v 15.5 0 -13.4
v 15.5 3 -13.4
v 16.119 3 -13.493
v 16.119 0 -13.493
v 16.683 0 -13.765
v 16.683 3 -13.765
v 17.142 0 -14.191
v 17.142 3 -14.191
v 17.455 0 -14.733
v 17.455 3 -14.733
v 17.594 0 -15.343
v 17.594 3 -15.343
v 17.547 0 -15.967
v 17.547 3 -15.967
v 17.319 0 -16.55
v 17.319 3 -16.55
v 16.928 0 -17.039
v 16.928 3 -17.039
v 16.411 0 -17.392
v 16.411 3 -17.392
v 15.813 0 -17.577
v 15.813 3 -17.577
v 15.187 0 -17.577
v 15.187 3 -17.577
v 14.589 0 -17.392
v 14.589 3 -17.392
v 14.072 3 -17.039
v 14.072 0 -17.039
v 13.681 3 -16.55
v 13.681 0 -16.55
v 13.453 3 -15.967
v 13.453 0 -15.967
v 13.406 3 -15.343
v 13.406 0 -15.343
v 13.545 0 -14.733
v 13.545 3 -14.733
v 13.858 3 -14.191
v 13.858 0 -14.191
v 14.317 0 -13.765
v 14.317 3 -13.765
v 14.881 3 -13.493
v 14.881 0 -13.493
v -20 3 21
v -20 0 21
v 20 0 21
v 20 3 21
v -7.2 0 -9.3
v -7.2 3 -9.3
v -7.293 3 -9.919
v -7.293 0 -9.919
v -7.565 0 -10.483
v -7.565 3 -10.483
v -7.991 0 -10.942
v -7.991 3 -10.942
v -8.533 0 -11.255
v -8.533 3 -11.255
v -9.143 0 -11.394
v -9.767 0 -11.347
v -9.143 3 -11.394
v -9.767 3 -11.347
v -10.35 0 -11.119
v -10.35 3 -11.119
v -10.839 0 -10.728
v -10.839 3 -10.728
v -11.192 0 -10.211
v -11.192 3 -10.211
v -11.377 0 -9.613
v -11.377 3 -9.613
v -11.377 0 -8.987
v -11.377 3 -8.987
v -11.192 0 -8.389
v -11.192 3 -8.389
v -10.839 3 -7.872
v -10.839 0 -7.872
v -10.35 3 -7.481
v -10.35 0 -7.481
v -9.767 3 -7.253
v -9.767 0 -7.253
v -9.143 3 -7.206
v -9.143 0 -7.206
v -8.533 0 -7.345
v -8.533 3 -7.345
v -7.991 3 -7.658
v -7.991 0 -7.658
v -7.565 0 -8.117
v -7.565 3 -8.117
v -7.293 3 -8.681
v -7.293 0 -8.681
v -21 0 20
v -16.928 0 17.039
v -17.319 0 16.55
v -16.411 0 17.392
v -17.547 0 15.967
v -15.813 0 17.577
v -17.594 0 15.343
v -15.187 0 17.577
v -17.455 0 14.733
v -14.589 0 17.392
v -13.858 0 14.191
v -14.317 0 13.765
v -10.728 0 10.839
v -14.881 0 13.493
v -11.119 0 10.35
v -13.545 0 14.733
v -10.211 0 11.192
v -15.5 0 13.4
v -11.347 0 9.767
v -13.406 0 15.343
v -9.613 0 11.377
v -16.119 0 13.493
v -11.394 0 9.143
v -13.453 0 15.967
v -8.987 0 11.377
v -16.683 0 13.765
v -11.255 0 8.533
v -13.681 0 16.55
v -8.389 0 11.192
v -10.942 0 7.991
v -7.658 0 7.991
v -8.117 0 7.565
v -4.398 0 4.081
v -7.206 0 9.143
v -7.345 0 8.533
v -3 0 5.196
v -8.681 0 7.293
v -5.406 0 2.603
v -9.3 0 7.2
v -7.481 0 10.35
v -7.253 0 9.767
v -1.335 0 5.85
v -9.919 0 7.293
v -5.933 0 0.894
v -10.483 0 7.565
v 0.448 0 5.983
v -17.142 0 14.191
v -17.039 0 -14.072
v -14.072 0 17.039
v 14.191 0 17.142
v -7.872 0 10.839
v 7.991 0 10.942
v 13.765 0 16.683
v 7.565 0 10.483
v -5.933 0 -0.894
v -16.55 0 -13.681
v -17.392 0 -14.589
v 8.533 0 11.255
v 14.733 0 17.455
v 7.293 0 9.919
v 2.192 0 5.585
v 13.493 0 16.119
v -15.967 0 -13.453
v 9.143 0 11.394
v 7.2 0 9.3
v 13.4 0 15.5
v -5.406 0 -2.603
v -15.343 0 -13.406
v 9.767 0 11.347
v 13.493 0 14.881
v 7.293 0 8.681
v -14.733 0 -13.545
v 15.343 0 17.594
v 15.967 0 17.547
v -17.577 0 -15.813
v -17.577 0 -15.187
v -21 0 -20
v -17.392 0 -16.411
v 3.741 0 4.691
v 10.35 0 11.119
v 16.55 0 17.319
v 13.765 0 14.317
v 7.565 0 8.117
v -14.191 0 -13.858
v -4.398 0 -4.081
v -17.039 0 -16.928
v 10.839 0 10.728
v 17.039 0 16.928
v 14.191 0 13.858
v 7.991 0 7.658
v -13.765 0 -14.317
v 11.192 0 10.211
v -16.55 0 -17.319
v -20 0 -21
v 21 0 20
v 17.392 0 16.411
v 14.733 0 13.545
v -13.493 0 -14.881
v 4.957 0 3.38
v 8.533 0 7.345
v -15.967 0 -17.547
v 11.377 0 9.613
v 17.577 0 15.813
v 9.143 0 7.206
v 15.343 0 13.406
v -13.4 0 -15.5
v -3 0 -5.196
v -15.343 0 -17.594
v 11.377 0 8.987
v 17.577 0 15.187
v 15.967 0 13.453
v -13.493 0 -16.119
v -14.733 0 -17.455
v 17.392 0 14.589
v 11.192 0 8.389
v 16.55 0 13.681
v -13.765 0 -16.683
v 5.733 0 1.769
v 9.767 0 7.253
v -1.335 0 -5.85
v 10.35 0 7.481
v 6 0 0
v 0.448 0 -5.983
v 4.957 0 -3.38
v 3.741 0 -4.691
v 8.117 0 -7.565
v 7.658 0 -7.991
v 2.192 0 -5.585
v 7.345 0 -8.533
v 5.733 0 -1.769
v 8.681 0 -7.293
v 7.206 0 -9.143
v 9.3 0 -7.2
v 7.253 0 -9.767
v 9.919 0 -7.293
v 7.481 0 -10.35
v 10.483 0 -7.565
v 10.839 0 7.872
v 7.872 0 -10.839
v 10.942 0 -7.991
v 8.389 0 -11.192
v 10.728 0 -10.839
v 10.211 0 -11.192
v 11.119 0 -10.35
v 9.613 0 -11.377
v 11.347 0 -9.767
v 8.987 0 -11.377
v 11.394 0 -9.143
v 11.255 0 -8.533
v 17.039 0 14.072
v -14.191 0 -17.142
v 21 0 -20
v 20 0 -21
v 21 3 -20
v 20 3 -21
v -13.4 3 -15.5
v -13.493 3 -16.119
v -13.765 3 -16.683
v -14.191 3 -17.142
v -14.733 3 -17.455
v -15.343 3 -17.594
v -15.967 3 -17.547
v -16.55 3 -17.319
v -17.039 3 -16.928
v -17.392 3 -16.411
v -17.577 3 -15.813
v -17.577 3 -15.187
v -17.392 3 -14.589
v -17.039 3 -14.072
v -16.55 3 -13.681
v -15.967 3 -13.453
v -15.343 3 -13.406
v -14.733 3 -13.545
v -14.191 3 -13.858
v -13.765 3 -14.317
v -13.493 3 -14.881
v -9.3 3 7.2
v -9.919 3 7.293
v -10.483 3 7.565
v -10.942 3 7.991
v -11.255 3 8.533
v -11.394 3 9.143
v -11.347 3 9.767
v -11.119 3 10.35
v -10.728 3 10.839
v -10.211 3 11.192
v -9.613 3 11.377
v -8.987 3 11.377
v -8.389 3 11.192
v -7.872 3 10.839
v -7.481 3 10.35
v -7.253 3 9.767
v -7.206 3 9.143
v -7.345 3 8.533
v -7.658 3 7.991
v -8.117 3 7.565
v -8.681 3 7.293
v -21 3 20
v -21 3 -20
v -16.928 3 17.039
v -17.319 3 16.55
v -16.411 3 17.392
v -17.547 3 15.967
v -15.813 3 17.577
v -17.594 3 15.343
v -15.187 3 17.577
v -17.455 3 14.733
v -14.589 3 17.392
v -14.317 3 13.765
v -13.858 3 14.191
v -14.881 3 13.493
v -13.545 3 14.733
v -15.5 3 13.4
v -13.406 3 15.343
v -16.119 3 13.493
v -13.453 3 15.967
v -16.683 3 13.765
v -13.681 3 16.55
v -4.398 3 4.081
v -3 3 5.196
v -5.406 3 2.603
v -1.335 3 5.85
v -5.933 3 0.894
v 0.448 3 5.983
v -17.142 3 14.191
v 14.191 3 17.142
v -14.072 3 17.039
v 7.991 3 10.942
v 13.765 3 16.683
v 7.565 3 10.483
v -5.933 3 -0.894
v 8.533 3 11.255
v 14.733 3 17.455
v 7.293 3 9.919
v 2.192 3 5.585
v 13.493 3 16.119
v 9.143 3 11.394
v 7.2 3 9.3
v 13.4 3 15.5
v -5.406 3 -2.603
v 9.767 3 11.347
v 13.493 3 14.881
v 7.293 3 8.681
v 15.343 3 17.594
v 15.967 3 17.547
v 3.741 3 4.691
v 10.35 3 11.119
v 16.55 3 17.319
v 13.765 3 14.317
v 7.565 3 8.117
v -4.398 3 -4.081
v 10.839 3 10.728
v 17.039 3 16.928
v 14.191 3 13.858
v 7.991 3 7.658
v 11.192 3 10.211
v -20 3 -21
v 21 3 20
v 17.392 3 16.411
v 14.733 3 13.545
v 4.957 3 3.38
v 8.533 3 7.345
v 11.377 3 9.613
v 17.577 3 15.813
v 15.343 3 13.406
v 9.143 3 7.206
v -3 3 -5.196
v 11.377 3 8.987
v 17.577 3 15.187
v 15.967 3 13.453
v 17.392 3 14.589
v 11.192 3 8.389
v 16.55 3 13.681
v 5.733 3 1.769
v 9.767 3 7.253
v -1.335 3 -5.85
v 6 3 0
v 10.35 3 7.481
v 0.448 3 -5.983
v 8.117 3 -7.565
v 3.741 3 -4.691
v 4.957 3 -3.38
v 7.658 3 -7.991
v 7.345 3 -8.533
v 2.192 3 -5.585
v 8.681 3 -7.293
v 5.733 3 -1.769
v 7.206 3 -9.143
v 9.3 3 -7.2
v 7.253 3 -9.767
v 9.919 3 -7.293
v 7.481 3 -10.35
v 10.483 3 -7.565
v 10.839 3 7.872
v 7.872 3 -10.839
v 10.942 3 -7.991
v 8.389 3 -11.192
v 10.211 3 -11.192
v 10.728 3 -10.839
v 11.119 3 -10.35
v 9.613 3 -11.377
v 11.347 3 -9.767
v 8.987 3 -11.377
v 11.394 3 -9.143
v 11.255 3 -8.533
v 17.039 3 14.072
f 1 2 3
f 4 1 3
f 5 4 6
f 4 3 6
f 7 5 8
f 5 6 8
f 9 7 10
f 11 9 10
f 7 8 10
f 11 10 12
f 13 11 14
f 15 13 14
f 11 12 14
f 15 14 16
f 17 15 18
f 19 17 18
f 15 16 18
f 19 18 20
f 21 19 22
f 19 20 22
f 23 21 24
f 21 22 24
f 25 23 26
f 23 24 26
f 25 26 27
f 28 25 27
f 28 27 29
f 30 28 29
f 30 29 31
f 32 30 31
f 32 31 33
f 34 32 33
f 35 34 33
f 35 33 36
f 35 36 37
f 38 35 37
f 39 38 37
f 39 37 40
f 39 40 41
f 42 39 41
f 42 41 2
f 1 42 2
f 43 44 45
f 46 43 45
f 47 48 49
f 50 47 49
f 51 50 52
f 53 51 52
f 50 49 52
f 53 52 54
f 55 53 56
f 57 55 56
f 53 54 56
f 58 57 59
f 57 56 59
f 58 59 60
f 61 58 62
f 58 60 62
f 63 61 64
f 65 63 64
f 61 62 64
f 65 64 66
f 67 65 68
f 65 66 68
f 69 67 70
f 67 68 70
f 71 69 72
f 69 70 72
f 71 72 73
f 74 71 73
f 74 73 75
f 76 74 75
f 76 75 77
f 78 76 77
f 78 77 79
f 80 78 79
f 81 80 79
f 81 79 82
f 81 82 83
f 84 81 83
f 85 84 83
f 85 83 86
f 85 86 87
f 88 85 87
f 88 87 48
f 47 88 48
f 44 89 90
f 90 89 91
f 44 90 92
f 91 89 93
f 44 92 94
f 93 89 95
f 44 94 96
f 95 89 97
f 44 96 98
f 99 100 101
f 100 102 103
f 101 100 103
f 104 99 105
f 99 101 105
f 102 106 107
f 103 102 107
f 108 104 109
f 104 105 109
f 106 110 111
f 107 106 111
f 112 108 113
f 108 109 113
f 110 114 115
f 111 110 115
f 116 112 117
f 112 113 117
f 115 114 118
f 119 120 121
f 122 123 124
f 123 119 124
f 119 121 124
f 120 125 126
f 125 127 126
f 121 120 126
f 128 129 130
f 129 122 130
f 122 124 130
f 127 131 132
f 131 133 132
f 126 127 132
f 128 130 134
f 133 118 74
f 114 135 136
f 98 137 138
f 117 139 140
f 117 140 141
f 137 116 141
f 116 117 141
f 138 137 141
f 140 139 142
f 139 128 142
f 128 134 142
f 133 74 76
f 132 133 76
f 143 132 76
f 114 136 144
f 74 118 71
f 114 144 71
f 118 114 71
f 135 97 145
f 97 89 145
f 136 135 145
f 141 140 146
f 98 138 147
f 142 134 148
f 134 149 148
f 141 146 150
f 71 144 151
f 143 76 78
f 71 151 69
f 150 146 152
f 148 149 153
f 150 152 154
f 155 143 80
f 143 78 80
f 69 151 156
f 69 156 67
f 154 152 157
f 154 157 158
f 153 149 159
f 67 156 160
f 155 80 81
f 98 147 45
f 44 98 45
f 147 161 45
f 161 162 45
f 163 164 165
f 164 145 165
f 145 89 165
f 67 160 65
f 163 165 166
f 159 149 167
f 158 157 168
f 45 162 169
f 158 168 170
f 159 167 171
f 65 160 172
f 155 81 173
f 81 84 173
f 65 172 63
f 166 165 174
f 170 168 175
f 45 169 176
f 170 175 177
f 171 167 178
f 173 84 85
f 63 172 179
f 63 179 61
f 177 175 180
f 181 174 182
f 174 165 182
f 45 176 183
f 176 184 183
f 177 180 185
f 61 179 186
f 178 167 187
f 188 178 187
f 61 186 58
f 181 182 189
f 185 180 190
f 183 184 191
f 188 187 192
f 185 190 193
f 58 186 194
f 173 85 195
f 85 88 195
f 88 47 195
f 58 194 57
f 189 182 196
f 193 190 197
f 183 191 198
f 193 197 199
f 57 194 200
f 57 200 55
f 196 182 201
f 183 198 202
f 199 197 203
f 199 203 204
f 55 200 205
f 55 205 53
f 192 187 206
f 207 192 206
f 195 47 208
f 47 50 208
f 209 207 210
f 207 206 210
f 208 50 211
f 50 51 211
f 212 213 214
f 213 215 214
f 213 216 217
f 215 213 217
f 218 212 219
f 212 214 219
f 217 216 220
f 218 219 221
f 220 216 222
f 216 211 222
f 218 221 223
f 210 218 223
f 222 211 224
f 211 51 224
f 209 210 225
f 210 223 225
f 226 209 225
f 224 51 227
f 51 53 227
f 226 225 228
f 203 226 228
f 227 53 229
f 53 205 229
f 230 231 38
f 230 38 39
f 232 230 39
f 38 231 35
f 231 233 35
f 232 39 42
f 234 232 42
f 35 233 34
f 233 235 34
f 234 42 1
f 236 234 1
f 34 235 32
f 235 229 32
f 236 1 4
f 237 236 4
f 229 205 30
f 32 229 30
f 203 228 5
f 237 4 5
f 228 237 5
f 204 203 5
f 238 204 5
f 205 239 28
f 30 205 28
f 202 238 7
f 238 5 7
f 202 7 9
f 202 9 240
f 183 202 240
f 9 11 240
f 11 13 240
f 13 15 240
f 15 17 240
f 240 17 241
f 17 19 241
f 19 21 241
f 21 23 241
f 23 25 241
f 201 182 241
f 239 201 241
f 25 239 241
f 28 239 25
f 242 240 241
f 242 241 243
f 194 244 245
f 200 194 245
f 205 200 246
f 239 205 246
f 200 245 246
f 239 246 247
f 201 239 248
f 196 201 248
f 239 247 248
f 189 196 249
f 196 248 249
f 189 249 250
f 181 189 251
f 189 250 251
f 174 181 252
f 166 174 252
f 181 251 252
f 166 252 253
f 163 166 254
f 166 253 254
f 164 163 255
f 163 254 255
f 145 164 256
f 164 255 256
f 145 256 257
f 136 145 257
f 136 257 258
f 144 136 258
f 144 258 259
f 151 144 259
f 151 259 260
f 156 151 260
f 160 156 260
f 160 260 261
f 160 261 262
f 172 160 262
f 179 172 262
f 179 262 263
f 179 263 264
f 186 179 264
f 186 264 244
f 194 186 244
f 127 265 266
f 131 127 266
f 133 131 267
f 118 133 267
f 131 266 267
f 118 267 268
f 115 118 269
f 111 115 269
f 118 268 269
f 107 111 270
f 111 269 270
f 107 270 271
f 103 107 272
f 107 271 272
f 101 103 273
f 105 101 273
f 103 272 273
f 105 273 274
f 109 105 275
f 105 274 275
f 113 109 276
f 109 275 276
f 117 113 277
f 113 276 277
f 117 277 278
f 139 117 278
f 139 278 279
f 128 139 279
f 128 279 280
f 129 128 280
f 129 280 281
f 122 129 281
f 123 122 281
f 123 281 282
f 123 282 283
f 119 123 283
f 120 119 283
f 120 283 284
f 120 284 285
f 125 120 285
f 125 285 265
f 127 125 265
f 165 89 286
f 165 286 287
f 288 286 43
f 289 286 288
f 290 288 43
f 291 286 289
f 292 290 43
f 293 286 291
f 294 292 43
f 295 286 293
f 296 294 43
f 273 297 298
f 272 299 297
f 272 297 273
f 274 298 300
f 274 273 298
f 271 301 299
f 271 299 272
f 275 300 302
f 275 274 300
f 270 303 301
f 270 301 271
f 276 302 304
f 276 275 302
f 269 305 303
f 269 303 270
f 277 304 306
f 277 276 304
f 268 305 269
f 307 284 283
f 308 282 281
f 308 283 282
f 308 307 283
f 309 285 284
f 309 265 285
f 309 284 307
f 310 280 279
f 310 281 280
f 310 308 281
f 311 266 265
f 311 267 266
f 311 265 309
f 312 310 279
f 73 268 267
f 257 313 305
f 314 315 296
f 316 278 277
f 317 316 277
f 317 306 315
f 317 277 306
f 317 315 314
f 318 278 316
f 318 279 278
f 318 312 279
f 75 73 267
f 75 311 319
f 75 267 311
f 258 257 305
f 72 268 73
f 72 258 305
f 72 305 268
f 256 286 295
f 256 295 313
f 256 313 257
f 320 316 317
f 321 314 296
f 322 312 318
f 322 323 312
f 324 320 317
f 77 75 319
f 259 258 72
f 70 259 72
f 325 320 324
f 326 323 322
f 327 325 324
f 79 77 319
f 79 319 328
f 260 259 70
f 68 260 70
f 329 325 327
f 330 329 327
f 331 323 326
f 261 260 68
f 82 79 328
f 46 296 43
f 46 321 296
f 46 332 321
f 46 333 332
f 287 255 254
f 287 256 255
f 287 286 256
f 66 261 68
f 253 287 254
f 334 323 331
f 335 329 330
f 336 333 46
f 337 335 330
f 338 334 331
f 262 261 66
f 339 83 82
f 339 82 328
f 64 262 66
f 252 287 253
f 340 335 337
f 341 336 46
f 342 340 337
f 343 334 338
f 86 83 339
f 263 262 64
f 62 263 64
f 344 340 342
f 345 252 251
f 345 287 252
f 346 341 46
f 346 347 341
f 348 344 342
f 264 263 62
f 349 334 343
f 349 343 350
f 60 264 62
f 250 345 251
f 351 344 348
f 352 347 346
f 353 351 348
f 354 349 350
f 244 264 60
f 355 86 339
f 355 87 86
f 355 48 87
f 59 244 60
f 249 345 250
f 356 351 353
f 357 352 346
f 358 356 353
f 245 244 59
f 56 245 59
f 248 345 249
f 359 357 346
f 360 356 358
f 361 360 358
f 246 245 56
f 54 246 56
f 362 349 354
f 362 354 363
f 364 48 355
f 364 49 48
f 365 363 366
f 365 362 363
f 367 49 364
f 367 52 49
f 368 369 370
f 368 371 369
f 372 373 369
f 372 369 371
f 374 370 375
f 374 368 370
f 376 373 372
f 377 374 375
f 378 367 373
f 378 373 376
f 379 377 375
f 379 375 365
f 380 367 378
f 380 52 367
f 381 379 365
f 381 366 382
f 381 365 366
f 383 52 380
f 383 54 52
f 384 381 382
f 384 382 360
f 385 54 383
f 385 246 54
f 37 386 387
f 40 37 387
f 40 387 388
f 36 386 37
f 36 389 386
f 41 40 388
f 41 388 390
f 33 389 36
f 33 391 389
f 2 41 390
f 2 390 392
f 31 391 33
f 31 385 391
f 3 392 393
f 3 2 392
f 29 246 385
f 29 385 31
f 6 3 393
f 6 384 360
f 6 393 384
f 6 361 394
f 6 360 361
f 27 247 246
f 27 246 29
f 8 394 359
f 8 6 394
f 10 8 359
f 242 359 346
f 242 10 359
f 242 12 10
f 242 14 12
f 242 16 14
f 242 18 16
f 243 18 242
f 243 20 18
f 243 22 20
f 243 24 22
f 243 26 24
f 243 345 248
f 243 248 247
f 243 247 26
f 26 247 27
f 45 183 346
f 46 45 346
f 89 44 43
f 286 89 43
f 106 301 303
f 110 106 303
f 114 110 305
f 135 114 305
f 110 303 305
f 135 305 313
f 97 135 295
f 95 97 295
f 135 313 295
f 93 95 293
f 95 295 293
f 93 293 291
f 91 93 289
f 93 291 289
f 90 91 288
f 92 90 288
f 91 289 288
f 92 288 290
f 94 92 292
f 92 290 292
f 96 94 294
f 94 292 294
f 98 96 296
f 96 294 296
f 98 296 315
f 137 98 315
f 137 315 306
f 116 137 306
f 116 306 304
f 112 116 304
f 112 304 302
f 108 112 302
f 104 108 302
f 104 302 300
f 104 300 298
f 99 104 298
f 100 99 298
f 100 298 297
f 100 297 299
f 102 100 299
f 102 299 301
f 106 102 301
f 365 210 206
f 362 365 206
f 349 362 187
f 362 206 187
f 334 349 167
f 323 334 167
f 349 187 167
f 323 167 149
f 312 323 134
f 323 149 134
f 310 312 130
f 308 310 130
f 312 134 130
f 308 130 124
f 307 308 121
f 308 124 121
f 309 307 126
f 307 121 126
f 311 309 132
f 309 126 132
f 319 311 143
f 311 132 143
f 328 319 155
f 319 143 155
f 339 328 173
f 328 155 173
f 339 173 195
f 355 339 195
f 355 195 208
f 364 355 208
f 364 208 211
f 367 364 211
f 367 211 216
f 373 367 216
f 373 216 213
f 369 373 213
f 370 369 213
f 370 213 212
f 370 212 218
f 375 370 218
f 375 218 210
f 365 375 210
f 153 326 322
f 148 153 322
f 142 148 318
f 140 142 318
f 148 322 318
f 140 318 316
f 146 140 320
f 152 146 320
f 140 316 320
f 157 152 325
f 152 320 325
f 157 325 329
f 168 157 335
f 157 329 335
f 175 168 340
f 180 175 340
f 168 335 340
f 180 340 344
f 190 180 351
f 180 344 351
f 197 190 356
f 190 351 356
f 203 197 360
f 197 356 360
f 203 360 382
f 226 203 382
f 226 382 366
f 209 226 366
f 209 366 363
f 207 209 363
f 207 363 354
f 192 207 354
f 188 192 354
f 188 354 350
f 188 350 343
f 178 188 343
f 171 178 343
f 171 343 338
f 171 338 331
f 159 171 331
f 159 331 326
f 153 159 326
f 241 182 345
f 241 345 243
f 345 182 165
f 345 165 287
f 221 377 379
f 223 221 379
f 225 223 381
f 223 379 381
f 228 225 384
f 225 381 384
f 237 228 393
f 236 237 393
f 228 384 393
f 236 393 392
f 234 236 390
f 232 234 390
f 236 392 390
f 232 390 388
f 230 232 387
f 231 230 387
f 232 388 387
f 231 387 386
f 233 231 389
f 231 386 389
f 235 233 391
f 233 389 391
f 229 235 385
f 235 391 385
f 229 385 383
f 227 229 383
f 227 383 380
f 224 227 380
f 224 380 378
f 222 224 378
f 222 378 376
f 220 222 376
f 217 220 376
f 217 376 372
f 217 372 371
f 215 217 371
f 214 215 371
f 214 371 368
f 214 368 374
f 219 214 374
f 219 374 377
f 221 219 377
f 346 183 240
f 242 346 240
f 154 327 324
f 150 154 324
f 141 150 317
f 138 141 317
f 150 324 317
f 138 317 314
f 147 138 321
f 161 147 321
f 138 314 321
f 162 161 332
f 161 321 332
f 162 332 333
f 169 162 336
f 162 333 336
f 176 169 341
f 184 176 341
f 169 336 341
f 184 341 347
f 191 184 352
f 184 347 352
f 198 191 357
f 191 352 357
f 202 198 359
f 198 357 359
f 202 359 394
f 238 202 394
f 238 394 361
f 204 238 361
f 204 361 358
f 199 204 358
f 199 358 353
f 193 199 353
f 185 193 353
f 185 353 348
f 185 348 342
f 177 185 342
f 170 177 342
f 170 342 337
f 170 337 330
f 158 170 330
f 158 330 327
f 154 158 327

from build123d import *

# Parameters (mm, degrees)
SKETCH_1_W               = 42
SKETCH_1_H               = 42
EXTRUDE_1_DEPTH          = 3
SKETCH_2_R               = 6
CUT_EXTRUDE_1_DEPTH      = 4
SKETCH_4_R               = 2.1
CUT_EXTRUDE_2_DEPTH      = 4
SKETCH_5_R               = 2.1
CUT_EXTRUDE_3_DEPTH      = 4
PATTERN_CIRCULAR_1_COUNT = 4
CHAMFER_1_SIZE           = 1


with BuildPart() as part:
    # 草圖1 → 填料-伸長1 (new body)
    with BuildSketch(Plane(origin=(0, 0, 0), x_dir=(1, 0, 0), z_dir=(0, 1, 0))):
        Rectangle(SKETCH_1_W, SKETCH_1_H)
    extrude(amount=EXTRUDE_1_DEPTH)

    # 草圖2 → 除料-伸長1 (cut, through all)
    with BuildSketch(Plane.XZ):
        Circle(SKETCH_2_R)
    extrude(amount=-CUT_EXTRUDE_1_DEPTH, mode=Mode.SUBTRACT)

    # 草圖4 → 除料-伸長2 (cut, through all)
    with BuildSketch(Plane(origin=(0, 3, 0), x_dir=(1, 0, 0), z_dir=(0, 1, 0))):
        with Locations((-9.3, 9.3)):
            Circle(SKETCH_4_R)
    cut_extrude_2 = extrude(amount=-CUT_EXTRUDE_2_DEPTH, mode=Mode.SUBTRACT)

    # 草圖5 → 除料-伸長3 (cut, through all)
    with BuildSketch(Plane(origin=(0, 3, 0), x_dir=(1, 0, 0), z_dir=(0, 1, 0))):
        with Locations((-15.5, 15.5)):
            Circle(SKETCH_5_R)
    cut_extrude_3 = extrude(amount=-CUT_EXTRUDE_3_DEPTH, mode=Mode.SUBTRACT)

    # 環狀複製排列1: 除料-伸長2, 除料-伸長3 ×4 about axis
    pattern_circular_1_axis = Axis((0, 0, 0), (0, 1, 0))
    for i in range(1, PATTERN_CIRCULAR_1_COUNT):
        add(cut_extrude_2.rotate(pattern_circular_1_axis, i * 360 / PATTERN_CIRCULAR_1_COUNT), mode=Mode.SUBTRACT)
        add(cut_extrude_3.rotate(pattern_circular_1_axis, i * 360 / PATTERN_CIRCULAR_1_COUNT), mode=Mode.SUBTRACT)

    # 導角1
    chamfer_1_edges = [part.edges().sort_by_distance(p)[0] for p in [
        (21, 1.5, 21),
        (-21, 1.5, 21),
        (-21, 1.5, -21),
        (21, 1.5, -21),
    ]]
    chamfer(chamfer_1_edges, length=CHAMFER_1_SIZE)


solid = part.part
